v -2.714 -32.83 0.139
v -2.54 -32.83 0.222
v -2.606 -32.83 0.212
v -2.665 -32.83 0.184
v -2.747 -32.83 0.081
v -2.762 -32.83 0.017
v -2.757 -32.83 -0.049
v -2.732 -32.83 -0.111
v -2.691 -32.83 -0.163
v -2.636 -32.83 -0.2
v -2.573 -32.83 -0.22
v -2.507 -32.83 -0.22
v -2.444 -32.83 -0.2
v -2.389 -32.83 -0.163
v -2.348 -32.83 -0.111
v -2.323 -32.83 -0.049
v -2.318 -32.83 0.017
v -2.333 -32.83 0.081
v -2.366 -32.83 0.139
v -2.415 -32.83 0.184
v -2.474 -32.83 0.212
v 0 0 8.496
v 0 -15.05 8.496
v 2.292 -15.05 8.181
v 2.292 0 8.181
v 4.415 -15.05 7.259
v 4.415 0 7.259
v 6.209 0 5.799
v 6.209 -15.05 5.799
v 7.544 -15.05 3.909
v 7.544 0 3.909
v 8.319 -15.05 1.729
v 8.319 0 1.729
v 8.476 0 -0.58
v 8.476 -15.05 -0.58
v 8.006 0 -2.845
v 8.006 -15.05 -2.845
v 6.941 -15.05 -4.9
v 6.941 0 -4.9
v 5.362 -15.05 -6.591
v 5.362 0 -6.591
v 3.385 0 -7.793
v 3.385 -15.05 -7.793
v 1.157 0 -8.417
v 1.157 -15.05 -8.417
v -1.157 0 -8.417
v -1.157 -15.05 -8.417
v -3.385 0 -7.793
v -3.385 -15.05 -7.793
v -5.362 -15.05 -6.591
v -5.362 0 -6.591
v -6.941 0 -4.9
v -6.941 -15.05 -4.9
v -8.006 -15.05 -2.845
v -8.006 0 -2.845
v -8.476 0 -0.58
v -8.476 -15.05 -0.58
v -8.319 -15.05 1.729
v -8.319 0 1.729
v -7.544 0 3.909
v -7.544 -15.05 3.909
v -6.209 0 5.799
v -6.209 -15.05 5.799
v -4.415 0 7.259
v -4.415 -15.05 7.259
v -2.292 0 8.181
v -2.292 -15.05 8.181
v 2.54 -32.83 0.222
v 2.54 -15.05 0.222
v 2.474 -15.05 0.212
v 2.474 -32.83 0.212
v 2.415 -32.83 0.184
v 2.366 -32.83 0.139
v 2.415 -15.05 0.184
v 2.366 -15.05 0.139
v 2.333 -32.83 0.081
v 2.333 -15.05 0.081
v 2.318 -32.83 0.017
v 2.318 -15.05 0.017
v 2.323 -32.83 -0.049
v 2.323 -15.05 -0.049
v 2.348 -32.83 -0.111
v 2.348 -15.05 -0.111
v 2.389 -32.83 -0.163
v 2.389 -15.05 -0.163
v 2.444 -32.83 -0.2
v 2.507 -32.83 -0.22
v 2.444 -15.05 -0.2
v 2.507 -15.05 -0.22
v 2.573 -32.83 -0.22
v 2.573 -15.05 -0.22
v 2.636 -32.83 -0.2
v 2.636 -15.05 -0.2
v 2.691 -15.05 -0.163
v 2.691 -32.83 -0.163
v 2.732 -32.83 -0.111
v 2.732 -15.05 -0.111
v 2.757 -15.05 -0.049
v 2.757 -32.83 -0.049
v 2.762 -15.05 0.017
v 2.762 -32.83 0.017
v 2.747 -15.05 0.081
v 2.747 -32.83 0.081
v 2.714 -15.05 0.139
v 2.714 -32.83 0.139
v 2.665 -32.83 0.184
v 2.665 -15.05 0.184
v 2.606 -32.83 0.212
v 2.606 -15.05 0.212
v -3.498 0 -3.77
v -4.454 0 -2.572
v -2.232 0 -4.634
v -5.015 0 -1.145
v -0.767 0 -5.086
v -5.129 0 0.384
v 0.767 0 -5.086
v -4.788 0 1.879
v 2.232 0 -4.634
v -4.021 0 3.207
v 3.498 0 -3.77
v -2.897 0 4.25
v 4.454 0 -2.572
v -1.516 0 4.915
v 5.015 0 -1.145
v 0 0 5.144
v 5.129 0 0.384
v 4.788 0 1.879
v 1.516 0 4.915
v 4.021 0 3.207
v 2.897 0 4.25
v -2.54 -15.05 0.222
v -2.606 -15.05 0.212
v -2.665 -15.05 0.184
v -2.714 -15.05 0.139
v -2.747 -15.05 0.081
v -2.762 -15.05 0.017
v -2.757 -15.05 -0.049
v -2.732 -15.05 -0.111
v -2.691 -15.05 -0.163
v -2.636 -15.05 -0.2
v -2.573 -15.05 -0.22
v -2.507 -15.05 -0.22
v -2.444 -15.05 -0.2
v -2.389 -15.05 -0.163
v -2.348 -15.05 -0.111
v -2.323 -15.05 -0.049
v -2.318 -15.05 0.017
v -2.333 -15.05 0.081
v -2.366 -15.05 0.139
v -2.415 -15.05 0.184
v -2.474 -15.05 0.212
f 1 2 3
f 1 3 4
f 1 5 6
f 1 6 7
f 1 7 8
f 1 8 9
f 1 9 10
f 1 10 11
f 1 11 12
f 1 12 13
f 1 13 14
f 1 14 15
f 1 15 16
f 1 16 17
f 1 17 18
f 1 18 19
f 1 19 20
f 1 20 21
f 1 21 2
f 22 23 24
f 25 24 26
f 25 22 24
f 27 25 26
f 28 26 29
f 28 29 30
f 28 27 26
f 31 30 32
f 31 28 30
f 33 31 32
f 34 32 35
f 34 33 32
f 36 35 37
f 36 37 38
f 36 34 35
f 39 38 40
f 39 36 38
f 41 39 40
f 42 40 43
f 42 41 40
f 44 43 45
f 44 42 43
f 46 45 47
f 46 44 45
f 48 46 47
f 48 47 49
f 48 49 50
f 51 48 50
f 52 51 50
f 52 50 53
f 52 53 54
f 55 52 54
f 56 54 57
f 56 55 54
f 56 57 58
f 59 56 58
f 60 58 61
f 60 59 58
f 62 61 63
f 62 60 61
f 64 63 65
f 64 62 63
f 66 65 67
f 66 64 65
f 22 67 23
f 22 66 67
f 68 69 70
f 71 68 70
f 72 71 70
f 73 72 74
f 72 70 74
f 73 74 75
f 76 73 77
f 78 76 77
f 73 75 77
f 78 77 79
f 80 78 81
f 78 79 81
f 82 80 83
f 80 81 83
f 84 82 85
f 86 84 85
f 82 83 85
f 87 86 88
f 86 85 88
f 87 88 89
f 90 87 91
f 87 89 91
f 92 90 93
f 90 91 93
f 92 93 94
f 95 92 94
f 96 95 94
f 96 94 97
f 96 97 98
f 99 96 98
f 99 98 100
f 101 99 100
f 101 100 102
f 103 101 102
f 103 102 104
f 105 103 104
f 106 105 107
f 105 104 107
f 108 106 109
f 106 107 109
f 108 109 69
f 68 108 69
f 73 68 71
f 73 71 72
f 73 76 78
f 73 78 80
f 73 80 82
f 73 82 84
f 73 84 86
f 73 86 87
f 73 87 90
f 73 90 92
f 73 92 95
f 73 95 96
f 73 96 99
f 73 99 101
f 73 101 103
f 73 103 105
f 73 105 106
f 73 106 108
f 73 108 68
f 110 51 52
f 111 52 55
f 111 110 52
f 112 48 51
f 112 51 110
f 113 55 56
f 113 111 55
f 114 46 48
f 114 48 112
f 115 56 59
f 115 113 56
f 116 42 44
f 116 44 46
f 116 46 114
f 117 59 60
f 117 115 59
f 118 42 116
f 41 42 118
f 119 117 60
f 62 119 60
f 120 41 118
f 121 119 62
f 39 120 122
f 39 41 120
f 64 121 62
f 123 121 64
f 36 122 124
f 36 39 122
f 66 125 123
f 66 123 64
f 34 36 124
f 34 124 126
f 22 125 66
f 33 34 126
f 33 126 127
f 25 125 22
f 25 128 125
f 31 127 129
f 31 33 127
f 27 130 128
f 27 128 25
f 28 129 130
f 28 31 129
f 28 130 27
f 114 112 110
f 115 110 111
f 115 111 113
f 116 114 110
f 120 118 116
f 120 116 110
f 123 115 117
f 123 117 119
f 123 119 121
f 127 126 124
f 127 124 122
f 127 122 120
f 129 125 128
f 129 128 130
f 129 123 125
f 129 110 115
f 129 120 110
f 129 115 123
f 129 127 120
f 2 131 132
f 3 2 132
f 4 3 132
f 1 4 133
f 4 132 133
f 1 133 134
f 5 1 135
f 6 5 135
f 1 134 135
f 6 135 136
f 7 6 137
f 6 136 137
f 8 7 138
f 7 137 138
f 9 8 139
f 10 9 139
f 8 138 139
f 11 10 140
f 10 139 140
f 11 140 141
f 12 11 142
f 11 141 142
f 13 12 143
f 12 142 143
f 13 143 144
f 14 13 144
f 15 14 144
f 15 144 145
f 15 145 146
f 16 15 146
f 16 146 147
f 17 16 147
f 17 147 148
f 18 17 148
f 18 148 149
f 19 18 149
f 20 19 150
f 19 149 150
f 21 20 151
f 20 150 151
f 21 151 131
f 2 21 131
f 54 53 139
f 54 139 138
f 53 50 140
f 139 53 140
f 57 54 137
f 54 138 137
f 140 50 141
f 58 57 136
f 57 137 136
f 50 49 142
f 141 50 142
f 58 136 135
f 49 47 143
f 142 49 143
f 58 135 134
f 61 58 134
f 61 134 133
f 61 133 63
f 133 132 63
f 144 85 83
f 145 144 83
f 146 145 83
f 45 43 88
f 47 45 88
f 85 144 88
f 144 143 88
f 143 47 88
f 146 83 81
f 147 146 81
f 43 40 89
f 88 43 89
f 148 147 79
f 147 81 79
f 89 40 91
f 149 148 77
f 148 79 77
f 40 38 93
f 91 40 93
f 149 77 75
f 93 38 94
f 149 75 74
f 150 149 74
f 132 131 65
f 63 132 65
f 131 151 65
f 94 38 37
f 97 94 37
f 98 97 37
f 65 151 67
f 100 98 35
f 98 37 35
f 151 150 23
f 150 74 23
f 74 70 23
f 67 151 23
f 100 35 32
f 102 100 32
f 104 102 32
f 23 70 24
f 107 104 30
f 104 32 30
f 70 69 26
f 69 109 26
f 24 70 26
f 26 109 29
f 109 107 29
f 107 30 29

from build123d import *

# Parameters (mm, degrees)
SKETCH1_R           = 8.4963
BOSS_EXTRUDE1_DEPTH = 15.0495
SKETCH3_R           = 0.22225
BOSS_EXTRUDE2_DEPTH = 17.78
SKETCH2_R           = 5.1435
BOSS_EXTRUDE3_DEPTH = 0.000254


with BuildPart() as part:
    # Sketch1 → Boss-Extrude1 (new body)
    with BuildSketch(Plane(origin=(0, 0, 0), x_dir=(1, 0, 0), z_dir=(0, 1, 0))):
        with Locations(Location((0, 0, 0), (0, 0, 270))):
            Circle(SKETCH1_R)
    extrude(amount=-BOSS_EXTRUDE1_DEPTH)

    # Sketch3 → Boss-Extrude2 (add)
    with BuildSketch(Plane(origin=(0, -15.0495, 0), x_dir=(-1, 0, 0), z_dir=(0, -1, 0))):
        with Locations(Location((2.54, 0, 0), (0, 0, 270))):
            Circle(SKETCH3_R)
        with Locations(Location((-2.54, 0, 0), (0, 0, 270))):
            Circle(SKETCH3_R)
    extrude(amount=BOSS_EXTRUDE2_DEPTH)

    # Sketch2 → Boss-Extrude3 (add)
    with BuildSketch(Plane(origin=(0, 0, 0), x_dir=(1, 0, 0), z_dir=(0, 1, 0))):
        with Locations(Location((0, 0, 0), (0, 0, 270))):
            Circle(SKETCH2_R)
    extrude(amount=BOSS_EXTRUDE3_DEPTH)


solid = part.part
